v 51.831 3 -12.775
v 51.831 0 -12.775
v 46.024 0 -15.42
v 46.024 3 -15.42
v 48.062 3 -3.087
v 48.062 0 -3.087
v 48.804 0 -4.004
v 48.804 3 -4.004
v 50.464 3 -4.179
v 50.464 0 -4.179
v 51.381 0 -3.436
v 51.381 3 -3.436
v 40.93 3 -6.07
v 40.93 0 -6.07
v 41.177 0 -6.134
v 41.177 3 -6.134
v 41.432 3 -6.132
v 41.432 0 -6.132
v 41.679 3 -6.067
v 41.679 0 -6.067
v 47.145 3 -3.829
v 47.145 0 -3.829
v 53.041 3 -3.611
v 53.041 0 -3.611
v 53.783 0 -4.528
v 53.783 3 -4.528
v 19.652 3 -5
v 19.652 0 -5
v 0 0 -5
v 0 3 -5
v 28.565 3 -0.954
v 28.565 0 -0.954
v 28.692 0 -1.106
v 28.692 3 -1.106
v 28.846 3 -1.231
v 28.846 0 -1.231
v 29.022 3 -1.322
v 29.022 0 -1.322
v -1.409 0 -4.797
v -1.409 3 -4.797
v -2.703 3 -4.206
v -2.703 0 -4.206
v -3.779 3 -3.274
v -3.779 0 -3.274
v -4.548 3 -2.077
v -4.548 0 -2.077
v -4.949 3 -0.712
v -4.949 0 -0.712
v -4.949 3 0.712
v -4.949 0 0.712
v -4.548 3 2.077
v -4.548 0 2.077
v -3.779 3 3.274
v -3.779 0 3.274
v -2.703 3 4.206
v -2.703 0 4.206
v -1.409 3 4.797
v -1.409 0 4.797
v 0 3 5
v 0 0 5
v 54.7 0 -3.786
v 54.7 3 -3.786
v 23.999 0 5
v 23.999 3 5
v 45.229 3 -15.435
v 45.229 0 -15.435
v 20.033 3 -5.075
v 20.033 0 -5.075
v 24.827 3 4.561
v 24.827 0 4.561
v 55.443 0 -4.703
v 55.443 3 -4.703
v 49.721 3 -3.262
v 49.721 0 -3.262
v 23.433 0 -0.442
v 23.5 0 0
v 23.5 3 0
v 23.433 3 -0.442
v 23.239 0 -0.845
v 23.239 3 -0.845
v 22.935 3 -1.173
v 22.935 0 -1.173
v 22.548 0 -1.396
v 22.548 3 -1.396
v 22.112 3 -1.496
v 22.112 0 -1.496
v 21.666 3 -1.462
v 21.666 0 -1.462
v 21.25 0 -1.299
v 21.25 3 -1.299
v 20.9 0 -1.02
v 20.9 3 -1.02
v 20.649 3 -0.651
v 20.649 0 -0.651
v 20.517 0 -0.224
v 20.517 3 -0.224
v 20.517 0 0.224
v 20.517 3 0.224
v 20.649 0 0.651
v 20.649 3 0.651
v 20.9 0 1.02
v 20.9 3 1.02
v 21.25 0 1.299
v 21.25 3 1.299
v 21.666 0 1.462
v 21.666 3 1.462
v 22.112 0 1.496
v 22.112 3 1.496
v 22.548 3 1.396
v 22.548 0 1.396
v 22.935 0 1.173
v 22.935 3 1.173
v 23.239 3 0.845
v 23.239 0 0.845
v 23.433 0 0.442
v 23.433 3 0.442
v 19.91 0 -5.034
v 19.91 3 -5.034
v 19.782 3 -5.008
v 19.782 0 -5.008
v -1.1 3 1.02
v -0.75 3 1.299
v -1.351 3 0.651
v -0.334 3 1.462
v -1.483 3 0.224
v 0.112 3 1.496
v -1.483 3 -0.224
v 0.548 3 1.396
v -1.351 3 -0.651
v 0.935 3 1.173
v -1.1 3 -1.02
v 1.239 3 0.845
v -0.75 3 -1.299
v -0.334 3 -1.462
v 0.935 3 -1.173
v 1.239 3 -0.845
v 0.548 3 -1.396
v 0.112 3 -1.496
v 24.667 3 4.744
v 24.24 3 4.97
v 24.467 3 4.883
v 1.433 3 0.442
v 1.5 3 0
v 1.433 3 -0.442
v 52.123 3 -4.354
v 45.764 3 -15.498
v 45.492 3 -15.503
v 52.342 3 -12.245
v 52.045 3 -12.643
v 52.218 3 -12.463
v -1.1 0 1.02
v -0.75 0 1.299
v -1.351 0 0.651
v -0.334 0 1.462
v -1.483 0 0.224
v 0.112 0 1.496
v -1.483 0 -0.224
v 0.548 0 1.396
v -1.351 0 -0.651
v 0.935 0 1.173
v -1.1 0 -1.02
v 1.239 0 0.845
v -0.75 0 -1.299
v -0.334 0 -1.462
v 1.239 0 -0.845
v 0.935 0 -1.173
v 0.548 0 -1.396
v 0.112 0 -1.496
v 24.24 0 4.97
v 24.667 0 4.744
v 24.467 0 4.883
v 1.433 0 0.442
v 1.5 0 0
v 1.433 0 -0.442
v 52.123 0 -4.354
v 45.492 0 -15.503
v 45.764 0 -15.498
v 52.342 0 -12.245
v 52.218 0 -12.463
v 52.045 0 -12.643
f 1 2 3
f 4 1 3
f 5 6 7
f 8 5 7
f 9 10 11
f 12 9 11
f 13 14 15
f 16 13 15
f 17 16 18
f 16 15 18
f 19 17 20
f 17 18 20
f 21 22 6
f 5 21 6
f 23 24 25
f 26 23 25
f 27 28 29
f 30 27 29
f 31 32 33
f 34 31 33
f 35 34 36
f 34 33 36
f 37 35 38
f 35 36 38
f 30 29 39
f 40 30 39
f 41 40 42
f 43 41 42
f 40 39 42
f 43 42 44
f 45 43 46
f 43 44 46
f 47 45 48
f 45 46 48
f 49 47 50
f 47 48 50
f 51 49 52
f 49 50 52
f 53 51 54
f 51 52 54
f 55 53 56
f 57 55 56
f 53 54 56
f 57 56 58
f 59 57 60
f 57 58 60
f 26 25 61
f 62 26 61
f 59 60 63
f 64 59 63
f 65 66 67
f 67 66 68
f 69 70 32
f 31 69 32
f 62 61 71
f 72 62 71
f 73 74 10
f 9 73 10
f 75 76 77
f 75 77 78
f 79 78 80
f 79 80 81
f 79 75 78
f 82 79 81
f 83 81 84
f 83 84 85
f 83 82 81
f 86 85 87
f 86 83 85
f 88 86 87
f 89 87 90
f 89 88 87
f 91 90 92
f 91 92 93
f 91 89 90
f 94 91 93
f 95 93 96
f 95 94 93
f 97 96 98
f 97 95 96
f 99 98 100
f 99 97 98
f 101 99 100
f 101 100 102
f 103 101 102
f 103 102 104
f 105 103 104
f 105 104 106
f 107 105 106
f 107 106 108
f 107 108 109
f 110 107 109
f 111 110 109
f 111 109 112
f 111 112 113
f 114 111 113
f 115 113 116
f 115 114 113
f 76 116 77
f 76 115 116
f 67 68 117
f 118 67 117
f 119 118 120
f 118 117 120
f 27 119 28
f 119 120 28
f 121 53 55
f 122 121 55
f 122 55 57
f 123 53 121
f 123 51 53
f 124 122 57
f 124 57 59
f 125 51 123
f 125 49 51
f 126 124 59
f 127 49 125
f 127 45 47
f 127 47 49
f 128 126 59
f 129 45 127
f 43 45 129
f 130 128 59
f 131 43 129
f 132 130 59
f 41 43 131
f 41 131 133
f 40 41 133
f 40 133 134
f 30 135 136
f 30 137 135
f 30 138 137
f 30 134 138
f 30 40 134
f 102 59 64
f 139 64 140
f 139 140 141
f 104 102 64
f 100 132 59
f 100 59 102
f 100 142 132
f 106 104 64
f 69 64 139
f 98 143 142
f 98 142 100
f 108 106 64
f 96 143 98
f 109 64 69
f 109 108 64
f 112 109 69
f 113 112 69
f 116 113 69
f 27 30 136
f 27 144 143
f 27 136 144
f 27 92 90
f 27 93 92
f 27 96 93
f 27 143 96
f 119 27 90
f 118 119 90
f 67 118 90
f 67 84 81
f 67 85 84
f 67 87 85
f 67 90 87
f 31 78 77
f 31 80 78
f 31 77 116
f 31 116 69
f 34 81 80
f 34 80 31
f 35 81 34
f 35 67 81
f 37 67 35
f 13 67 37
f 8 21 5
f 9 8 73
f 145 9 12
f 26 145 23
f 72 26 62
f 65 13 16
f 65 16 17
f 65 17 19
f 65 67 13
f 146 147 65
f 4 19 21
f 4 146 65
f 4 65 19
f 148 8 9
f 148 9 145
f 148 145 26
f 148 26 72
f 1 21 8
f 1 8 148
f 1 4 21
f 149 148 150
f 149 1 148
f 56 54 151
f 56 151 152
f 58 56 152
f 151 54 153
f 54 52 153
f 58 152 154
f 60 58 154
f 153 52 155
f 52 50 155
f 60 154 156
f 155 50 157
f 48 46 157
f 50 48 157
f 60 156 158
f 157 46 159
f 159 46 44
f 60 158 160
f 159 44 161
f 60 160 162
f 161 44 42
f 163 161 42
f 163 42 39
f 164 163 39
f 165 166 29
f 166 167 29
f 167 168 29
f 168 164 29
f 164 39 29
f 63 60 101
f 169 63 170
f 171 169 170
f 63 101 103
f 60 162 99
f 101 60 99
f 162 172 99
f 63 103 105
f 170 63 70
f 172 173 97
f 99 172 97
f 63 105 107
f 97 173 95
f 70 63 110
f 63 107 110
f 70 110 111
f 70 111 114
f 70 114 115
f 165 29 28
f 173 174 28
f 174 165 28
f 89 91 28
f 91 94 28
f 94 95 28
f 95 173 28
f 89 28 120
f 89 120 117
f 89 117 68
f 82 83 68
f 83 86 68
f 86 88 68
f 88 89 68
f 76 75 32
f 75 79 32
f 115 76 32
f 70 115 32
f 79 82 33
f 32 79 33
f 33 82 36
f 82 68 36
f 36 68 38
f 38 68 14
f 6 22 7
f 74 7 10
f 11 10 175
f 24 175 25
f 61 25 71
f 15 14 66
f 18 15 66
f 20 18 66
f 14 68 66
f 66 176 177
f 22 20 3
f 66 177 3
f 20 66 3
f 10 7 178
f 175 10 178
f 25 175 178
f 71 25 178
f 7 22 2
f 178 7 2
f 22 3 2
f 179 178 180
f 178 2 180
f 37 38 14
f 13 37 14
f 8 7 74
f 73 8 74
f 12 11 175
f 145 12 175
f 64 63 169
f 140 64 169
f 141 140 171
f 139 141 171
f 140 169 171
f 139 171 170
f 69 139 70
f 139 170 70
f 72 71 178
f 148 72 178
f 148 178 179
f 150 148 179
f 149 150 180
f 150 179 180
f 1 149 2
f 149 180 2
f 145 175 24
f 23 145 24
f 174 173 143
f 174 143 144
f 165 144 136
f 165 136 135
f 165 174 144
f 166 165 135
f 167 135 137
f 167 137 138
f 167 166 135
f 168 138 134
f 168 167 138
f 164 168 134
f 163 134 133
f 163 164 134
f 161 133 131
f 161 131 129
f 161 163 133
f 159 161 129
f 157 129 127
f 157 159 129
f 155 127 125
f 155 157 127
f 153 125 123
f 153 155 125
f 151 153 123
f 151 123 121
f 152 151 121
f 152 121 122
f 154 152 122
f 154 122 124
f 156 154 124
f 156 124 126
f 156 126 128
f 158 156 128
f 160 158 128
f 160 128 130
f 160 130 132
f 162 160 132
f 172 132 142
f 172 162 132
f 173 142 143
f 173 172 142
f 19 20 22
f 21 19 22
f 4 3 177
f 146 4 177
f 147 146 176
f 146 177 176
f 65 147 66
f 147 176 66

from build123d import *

# Parameters (mm, degrees)
SKETCH1_R           = 1.5
BOSS_EXTRUDE1_DEPTH = 3


with BuildPart() as part:
    # Sketch1 → Boss-Extrude1 (new body)
    with BuildSketch(Plane(origin=(0, 0, 0), x_dir=(1, 0, 0), z_dir=(0, 1, 0))):
        with BuildLine():
            Line((0, -5), (23.998875872, -5))
            ThreePointArc((23.998875872, -5), (24.467345461, -4.883479623), (24.826642543, -4.561072489))
            Line((24.826642543, -4.561072489), (28.564941326, 0.954149161))
            ThreePointArc((28.564941326, 0.954149161), (28.766036178, 1.172359953), (29.022312673, 1.321950886))
            Line((29.022312673, 1.321950886), (40.929553216, 6.070049343))
            ThreePointArc((40.929553216, 6.070049343), (41.304486381, 6.141164834), (41.678758689, 6.066649533))
            Line((41.678758689, 6.066649533), (47.144586244, 3.829406729))
            Line((47.144586244, 3.829406729), (48.06174016, 3.086958957))
            Line((48.06174016, 3.086958957), (48.804187932, 4.004112872))
            Line((48.804187932, 4.004112872), (49.721341848, 3.2616651))
            Line((49.721341848, 3.2616651), (50.46378962, 4.178819016))
            Line((50.46378962, 4.178819016), (51.380943536, 3.436371244))
            Line((51.380943536, 3.436371244), (52.123391308, 4.35352516))
            Line((52.123391308, 4.35352516), (53.040545224, 3.611077387))
            Line((53.040545224, 3.611077387), (53.782992996, 4.528231303))
            Line((53.782992996, 4.528231303), (54.700146912, 3.785783531))
            Line((54.700146912, 3.785783531), (55.442594685, 4.702937447))
            Line((55.442594685, 4.702937447), (52.341745918, 12.244834503))
            ThreePointArc((52.341745918, 12.244834503), (52.137055639, 12.558350103), (51.831402108, 12.774604725))
            Line((51.831402108, 12.774604725), (46.024183924, 15.419882568))
            ThreePointArc((46.024183924, 15.419882568), (45.628323444, 15.509674561), (45.229386093, 15.434727162))
            Line((45.229386093, 15.434727162), (20.032711481, 5.075121772))
            ThreePointArc((20.032711481, 5.075121772), (19.846254378, 5.018960187), (19.652448068, 5))
            Line((19.652448068, 5), (0, 5))
            ThreePointArc((0, 5), (-5, 0), (0, -5))
        make_face()
        Circle(SKETCH1_R, mode=Mode.SUBTRACT)
        with Locations((22, 0)):
            Circle(SKETCH1_R, mode=Mode.SUBTRACT)
    extrude(amount=BOSS_EXTRUDE1_DEPTH)


solid = part.part
